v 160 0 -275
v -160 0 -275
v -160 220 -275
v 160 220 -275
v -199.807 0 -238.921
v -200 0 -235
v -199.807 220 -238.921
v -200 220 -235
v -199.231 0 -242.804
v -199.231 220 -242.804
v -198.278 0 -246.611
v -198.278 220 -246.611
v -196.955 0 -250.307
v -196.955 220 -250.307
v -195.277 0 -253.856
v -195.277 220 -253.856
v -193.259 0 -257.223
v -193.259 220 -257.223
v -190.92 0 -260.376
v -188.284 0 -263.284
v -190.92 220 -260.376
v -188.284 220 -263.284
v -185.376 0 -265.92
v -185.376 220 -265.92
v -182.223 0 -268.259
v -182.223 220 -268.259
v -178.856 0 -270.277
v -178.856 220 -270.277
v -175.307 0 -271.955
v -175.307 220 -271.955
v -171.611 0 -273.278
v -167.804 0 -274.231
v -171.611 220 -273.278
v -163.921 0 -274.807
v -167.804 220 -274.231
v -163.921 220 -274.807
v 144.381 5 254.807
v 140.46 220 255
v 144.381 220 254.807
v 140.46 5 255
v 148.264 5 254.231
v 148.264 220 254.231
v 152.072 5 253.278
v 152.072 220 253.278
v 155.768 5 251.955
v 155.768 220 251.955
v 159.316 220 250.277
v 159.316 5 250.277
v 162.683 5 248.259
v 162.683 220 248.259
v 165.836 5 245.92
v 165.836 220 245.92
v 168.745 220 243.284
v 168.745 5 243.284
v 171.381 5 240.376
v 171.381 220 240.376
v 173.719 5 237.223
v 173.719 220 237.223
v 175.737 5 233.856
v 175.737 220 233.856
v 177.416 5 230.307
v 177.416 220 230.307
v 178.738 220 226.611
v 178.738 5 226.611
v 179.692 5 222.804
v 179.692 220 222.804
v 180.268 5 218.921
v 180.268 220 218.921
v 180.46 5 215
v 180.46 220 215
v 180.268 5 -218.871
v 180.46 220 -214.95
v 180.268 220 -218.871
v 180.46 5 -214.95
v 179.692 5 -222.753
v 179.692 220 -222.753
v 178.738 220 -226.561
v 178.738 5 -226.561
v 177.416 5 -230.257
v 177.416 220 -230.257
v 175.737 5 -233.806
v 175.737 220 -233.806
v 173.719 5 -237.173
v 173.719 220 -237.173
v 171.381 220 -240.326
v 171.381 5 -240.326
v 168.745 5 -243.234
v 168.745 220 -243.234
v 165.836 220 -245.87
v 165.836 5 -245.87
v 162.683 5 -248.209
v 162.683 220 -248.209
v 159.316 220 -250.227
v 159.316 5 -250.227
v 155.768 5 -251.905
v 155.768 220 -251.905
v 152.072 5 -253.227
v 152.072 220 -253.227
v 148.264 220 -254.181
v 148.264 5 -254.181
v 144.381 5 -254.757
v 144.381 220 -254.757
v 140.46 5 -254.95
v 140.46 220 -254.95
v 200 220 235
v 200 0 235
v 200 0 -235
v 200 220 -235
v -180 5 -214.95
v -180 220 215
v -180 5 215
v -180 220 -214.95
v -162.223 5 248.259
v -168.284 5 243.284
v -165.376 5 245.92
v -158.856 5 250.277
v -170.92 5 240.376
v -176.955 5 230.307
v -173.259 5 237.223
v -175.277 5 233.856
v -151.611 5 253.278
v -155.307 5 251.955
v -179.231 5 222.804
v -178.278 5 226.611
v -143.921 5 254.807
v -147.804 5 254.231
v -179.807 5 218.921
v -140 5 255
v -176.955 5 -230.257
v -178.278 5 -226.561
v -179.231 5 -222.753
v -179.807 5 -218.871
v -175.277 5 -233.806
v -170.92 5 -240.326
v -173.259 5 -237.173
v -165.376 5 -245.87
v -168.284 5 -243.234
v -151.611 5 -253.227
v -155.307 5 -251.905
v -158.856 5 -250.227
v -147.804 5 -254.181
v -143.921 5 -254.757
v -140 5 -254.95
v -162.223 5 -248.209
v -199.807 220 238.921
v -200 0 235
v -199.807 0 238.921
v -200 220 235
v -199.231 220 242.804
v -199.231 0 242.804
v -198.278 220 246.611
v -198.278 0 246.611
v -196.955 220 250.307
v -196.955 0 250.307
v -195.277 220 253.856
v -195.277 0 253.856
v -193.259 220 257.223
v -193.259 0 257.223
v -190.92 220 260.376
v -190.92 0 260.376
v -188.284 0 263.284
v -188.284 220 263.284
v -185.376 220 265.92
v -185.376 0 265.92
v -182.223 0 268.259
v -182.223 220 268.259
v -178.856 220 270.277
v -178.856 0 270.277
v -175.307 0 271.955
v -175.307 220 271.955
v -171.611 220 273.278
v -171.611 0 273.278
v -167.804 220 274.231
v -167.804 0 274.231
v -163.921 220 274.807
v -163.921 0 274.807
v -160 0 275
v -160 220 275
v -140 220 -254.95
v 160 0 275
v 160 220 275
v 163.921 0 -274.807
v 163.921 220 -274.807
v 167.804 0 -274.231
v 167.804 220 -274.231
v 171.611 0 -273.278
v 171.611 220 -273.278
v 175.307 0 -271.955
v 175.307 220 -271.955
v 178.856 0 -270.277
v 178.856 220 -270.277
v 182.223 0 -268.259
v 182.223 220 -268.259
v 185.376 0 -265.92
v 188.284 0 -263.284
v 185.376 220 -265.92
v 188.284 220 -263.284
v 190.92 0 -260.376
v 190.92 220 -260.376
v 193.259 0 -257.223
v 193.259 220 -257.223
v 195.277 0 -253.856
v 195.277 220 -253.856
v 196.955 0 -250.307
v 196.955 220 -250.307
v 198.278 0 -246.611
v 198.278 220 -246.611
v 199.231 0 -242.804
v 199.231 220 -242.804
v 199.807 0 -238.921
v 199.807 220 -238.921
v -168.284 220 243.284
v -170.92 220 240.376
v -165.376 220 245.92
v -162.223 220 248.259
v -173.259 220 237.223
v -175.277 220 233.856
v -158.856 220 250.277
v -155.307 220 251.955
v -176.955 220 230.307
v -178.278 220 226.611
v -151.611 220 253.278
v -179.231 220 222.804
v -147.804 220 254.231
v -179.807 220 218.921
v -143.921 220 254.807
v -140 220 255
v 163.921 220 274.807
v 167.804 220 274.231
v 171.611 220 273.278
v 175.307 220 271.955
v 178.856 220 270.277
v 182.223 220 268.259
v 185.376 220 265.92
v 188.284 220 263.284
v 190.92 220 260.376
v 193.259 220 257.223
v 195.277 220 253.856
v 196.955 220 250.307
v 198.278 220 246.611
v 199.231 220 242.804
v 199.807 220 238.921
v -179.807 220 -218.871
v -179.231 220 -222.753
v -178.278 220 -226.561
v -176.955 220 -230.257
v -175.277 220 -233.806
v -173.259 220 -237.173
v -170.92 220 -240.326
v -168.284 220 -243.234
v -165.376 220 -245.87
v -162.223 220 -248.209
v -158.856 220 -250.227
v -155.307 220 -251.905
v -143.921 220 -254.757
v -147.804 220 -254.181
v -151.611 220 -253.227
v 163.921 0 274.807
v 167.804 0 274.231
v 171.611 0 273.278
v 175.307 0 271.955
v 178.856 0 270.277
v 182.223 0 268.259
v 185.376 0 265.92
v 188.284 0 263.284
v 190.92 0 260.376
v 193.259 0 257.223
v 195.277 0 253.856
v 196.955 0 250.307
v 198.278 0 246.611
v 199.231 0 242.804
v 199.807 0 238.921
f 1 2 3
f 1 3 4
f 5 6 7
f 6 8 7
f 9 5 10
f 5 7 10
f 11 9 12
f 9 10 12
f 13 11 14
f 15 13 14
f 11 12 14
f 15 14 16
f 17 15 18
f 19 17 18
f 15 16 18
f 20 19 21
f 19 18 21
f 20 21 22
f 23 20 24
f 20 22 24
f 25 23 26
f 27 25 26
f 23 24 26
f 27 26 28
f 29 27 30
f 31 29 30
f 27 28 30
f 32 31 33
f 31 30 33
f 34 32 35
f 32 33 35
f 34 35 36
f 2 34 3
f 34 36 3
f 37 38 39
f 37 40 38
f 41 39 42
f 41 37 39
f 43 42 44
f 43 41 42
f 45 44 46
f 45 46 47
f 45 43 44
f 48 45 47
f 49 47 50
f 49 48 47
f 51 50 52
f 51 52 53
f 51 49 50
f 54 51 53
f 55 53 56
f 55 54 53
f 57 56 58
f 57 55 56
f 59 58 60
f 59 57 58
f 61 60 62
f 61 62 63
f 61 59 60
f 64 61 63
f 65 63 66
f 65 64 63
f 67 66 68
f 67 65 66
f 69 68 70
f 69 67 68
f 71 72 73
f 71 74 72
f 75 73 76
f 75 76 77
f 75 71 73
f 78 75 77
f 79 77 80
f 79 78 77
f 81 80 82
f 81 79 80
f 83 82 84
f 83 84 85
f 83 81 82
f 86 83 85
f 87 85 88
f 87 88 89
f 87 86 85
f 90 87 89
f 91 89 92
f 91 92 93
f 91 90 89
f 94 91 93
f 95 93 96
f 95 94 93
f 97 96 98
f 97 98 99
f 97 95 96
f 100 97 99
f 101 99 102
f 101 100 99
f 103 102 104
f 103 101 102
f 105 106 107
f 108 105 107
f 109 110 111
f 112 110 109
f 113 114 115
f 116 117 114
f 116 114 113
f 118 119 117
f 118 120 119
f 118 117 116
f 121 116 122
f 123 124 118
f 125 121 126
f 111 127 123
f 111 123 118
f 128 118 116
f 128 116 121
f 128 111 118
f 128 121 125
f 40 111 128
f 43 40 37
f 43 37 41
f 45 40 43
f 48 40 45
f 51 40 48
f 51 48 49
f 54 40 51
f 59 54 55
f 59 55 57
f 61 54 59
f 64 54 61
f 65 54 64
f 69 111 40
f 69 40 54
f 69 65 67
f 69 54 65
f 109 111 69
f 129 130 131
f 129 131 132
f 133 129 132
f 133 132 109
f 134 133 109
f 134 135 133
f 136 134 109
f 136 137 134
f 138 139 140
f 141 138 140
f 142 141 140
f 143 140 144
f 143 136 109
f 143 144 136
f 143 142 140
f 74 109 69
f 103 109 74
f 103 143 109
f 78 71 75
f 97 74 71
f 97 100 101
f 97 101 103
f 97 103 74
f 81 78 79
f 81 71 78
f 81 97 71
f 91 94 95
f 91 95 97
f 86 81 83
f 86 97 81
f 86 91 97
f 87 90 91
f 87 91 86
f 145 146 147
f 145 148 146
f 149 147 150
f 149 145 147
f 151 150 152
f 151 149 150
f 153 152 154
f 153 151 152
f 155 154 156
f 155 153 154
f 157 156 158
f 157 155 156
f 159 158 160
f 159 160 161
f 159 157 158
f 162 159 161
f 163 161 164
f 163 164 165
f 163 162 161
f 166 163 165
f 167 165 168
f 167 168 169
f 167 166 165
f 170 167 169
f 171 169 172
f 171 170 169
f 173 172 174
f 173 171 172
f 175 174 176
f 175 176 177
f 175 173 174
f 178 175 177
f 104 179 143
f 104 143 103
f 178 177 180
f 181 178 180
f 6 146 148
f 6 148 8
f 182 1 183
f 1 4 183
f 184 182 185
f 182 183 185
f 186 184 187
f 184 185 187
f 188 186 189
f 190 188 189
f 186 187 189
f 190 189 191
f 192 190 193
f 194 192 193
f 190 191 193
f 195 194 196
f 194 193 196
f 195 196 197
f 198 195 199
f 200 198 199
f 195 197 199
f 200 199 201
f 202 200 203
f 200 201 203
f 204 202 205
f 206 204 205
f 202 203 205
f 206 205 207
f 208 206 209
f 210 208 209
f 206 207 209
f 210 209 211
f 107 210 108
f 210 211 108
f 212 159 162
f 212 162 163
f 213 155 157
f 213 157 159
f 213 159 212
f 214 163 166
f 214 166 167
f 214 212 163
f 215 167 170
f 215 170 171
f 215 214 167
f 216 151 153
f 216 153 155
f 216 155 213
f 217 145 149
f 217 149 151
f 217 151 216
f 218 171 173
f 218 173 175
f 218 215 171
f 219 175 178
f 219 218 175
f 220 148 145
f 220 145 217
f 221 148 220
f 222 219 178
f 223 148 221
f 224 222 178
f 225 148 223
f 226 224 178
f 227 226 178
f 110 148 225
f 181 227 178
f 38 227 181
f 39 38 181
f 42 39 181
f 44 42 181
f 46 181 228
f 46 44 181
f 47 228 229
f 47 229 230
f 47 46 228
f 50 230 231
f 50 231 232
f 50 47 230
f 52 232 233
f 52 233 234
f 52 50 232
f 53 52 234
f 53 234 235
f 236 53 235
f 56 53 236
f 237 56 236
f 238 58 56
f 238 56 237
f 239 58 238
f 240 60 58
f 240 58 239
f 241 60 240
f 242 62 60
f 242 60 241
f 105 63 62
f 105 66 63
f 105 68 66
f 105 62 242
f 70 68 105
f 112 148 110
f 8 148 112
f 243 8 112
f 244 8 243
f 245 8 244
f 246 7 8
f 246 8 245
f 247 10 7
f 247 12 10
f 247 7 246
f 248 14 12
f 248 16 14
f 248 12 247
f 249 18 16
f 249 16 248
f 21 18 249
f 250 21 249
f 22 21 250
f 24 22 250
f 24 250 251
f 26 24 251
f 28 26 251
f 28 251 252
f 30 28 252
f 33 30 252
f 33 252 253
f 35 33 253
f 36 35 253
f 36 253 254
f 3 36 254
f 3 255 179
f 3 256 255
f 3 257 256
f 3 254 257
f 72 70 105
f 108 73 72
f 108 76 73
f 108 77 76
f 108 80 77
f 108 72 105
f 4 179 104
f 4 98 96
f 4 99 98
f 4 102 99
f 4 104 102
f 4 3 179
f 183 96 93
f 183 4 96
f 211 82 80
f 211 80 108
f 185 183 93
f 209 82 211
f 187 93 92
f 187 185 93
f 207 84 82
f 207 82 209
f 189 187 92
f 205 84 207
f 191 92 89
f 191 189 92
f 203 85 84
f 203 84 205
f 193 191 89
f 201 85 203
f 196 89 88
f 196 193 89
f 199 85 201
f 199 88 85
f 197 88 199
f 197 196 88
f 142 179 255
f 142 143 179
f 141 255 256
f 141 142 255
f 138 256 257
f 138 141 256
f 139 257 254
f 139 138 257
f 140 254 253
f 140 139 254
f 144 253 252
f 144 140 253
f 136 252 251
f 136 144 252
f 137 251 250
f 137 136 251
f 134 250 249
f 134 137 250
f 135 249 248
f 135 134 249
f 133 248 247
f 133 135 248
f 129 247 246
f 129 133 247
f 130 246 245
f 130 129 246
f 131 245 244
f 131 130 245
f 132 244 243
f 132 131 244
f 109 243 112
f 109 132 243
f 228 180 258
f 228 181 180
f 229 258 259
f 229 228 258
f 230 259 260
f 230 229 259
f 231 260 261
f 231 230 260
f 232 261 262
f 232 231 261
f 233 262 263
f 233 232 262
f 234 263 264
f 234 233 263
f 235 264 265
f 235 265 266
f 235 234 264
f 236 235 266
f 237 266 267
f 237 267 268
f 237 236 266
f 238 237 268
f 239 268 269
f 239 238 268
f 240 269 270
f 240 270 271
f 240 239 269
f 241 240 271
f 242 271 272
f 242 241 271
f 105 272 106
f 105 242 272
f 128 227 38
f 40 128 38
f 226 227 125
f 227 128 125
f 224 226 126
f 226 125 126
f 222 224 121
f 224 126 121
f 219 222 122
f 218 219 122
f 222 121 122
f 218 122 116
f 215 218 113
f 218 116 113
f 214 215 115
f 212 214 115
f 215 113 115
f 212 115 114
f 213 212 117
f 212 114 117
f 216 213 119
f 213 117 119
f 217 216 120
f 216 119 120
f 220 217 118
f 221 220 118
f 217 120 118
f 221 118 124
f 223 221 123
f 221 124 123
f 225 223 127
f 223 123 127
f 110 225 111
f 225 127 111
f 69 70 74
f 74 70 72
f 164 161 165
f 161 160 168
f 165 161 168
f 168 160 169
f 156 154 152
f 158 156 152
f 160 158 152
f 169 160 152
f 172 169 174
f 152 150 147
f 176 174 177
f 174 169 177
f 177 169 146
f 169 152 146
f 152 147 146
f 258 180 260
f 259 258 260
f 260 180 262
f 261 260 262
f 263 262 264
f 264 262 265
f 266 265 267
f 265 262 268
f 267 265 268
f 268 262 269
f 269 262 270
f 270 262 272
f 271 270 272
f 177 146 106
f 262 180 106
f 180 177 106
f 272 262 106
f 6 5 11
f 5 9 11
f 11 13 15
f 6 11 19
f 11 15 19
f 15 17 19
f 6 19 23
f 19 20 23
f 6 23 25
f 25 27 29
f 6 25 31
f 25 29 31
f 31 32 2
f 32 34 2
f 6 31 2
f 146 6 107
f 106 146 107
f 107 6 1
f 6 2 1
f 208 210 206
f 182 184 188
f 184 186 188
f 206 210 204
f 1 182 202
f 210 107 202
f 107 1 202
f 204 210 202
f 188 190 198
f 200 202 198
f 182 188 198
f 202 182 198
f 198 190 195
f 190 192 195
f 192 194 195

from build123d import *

# Parameters (mm, degrees)
SKETCH1_W           = 400
SKETCH1_H           = 550
BOSS_EXTRUDE1_DEPTH = 220
SKETCH2_W           = 360.460384802
SKETCH2_H           = 509.949814821
CUT_EXTRUDE1_DEPTH  = 215
FILLET2_R           = 40
FILLET3_R           = 40


with BuildPart() as part:
    # Sketch1 → Boss-Extrude1 (new body)
    with BuildSketch(Plane(origin=(0, 0, 0), x_dir=(1, 0, 0), z_dir=(0, 1, 0))):
        Rectangle(SKETCH1_W, SKETCH1_H)
    extrude(amount=BOSS_EXTRUDE1_DEPTH)

    # Sketch2 → Cut-Extrude1 (cut)
    with BuildSketch(Plane(origin=(0, 220, 0), x_dir=(1, 0, 0), z_dir=(0, 1, 0))):
        with Locations((0.230192401, -0.02509259)):
            Rectangle(SKETCH2_W, SKETCH2_H)
    extrude(amount=-CUT_EXTRUDE1_DEPTH, mode=Mode.SUBTRACT)

    # Fillet2
    fillet2_edges = [part.edges().sort_by_distance(p)[0] for p in [
        (200, 110, 275),
        (-200, 110, 275),
        (-200, 110, -275),
        (200, 110, -275),
    ]]
    fillet(fillet2_edges, radius=FILLET2_R)

    # Fillet3
    fillet3_edges = [part.edges().sort_by_distance(p)[0] for p in [
        (180.460384802, 112.5, -254.949814821),
        (180.460384802, 112.5, 255),
        (-180, 112.5, 255),
        (-180, 112.5, -254.949814821),
    ]]
    fillet(fillet3_edges, radius=FILLET3_R)


solid = part.part
